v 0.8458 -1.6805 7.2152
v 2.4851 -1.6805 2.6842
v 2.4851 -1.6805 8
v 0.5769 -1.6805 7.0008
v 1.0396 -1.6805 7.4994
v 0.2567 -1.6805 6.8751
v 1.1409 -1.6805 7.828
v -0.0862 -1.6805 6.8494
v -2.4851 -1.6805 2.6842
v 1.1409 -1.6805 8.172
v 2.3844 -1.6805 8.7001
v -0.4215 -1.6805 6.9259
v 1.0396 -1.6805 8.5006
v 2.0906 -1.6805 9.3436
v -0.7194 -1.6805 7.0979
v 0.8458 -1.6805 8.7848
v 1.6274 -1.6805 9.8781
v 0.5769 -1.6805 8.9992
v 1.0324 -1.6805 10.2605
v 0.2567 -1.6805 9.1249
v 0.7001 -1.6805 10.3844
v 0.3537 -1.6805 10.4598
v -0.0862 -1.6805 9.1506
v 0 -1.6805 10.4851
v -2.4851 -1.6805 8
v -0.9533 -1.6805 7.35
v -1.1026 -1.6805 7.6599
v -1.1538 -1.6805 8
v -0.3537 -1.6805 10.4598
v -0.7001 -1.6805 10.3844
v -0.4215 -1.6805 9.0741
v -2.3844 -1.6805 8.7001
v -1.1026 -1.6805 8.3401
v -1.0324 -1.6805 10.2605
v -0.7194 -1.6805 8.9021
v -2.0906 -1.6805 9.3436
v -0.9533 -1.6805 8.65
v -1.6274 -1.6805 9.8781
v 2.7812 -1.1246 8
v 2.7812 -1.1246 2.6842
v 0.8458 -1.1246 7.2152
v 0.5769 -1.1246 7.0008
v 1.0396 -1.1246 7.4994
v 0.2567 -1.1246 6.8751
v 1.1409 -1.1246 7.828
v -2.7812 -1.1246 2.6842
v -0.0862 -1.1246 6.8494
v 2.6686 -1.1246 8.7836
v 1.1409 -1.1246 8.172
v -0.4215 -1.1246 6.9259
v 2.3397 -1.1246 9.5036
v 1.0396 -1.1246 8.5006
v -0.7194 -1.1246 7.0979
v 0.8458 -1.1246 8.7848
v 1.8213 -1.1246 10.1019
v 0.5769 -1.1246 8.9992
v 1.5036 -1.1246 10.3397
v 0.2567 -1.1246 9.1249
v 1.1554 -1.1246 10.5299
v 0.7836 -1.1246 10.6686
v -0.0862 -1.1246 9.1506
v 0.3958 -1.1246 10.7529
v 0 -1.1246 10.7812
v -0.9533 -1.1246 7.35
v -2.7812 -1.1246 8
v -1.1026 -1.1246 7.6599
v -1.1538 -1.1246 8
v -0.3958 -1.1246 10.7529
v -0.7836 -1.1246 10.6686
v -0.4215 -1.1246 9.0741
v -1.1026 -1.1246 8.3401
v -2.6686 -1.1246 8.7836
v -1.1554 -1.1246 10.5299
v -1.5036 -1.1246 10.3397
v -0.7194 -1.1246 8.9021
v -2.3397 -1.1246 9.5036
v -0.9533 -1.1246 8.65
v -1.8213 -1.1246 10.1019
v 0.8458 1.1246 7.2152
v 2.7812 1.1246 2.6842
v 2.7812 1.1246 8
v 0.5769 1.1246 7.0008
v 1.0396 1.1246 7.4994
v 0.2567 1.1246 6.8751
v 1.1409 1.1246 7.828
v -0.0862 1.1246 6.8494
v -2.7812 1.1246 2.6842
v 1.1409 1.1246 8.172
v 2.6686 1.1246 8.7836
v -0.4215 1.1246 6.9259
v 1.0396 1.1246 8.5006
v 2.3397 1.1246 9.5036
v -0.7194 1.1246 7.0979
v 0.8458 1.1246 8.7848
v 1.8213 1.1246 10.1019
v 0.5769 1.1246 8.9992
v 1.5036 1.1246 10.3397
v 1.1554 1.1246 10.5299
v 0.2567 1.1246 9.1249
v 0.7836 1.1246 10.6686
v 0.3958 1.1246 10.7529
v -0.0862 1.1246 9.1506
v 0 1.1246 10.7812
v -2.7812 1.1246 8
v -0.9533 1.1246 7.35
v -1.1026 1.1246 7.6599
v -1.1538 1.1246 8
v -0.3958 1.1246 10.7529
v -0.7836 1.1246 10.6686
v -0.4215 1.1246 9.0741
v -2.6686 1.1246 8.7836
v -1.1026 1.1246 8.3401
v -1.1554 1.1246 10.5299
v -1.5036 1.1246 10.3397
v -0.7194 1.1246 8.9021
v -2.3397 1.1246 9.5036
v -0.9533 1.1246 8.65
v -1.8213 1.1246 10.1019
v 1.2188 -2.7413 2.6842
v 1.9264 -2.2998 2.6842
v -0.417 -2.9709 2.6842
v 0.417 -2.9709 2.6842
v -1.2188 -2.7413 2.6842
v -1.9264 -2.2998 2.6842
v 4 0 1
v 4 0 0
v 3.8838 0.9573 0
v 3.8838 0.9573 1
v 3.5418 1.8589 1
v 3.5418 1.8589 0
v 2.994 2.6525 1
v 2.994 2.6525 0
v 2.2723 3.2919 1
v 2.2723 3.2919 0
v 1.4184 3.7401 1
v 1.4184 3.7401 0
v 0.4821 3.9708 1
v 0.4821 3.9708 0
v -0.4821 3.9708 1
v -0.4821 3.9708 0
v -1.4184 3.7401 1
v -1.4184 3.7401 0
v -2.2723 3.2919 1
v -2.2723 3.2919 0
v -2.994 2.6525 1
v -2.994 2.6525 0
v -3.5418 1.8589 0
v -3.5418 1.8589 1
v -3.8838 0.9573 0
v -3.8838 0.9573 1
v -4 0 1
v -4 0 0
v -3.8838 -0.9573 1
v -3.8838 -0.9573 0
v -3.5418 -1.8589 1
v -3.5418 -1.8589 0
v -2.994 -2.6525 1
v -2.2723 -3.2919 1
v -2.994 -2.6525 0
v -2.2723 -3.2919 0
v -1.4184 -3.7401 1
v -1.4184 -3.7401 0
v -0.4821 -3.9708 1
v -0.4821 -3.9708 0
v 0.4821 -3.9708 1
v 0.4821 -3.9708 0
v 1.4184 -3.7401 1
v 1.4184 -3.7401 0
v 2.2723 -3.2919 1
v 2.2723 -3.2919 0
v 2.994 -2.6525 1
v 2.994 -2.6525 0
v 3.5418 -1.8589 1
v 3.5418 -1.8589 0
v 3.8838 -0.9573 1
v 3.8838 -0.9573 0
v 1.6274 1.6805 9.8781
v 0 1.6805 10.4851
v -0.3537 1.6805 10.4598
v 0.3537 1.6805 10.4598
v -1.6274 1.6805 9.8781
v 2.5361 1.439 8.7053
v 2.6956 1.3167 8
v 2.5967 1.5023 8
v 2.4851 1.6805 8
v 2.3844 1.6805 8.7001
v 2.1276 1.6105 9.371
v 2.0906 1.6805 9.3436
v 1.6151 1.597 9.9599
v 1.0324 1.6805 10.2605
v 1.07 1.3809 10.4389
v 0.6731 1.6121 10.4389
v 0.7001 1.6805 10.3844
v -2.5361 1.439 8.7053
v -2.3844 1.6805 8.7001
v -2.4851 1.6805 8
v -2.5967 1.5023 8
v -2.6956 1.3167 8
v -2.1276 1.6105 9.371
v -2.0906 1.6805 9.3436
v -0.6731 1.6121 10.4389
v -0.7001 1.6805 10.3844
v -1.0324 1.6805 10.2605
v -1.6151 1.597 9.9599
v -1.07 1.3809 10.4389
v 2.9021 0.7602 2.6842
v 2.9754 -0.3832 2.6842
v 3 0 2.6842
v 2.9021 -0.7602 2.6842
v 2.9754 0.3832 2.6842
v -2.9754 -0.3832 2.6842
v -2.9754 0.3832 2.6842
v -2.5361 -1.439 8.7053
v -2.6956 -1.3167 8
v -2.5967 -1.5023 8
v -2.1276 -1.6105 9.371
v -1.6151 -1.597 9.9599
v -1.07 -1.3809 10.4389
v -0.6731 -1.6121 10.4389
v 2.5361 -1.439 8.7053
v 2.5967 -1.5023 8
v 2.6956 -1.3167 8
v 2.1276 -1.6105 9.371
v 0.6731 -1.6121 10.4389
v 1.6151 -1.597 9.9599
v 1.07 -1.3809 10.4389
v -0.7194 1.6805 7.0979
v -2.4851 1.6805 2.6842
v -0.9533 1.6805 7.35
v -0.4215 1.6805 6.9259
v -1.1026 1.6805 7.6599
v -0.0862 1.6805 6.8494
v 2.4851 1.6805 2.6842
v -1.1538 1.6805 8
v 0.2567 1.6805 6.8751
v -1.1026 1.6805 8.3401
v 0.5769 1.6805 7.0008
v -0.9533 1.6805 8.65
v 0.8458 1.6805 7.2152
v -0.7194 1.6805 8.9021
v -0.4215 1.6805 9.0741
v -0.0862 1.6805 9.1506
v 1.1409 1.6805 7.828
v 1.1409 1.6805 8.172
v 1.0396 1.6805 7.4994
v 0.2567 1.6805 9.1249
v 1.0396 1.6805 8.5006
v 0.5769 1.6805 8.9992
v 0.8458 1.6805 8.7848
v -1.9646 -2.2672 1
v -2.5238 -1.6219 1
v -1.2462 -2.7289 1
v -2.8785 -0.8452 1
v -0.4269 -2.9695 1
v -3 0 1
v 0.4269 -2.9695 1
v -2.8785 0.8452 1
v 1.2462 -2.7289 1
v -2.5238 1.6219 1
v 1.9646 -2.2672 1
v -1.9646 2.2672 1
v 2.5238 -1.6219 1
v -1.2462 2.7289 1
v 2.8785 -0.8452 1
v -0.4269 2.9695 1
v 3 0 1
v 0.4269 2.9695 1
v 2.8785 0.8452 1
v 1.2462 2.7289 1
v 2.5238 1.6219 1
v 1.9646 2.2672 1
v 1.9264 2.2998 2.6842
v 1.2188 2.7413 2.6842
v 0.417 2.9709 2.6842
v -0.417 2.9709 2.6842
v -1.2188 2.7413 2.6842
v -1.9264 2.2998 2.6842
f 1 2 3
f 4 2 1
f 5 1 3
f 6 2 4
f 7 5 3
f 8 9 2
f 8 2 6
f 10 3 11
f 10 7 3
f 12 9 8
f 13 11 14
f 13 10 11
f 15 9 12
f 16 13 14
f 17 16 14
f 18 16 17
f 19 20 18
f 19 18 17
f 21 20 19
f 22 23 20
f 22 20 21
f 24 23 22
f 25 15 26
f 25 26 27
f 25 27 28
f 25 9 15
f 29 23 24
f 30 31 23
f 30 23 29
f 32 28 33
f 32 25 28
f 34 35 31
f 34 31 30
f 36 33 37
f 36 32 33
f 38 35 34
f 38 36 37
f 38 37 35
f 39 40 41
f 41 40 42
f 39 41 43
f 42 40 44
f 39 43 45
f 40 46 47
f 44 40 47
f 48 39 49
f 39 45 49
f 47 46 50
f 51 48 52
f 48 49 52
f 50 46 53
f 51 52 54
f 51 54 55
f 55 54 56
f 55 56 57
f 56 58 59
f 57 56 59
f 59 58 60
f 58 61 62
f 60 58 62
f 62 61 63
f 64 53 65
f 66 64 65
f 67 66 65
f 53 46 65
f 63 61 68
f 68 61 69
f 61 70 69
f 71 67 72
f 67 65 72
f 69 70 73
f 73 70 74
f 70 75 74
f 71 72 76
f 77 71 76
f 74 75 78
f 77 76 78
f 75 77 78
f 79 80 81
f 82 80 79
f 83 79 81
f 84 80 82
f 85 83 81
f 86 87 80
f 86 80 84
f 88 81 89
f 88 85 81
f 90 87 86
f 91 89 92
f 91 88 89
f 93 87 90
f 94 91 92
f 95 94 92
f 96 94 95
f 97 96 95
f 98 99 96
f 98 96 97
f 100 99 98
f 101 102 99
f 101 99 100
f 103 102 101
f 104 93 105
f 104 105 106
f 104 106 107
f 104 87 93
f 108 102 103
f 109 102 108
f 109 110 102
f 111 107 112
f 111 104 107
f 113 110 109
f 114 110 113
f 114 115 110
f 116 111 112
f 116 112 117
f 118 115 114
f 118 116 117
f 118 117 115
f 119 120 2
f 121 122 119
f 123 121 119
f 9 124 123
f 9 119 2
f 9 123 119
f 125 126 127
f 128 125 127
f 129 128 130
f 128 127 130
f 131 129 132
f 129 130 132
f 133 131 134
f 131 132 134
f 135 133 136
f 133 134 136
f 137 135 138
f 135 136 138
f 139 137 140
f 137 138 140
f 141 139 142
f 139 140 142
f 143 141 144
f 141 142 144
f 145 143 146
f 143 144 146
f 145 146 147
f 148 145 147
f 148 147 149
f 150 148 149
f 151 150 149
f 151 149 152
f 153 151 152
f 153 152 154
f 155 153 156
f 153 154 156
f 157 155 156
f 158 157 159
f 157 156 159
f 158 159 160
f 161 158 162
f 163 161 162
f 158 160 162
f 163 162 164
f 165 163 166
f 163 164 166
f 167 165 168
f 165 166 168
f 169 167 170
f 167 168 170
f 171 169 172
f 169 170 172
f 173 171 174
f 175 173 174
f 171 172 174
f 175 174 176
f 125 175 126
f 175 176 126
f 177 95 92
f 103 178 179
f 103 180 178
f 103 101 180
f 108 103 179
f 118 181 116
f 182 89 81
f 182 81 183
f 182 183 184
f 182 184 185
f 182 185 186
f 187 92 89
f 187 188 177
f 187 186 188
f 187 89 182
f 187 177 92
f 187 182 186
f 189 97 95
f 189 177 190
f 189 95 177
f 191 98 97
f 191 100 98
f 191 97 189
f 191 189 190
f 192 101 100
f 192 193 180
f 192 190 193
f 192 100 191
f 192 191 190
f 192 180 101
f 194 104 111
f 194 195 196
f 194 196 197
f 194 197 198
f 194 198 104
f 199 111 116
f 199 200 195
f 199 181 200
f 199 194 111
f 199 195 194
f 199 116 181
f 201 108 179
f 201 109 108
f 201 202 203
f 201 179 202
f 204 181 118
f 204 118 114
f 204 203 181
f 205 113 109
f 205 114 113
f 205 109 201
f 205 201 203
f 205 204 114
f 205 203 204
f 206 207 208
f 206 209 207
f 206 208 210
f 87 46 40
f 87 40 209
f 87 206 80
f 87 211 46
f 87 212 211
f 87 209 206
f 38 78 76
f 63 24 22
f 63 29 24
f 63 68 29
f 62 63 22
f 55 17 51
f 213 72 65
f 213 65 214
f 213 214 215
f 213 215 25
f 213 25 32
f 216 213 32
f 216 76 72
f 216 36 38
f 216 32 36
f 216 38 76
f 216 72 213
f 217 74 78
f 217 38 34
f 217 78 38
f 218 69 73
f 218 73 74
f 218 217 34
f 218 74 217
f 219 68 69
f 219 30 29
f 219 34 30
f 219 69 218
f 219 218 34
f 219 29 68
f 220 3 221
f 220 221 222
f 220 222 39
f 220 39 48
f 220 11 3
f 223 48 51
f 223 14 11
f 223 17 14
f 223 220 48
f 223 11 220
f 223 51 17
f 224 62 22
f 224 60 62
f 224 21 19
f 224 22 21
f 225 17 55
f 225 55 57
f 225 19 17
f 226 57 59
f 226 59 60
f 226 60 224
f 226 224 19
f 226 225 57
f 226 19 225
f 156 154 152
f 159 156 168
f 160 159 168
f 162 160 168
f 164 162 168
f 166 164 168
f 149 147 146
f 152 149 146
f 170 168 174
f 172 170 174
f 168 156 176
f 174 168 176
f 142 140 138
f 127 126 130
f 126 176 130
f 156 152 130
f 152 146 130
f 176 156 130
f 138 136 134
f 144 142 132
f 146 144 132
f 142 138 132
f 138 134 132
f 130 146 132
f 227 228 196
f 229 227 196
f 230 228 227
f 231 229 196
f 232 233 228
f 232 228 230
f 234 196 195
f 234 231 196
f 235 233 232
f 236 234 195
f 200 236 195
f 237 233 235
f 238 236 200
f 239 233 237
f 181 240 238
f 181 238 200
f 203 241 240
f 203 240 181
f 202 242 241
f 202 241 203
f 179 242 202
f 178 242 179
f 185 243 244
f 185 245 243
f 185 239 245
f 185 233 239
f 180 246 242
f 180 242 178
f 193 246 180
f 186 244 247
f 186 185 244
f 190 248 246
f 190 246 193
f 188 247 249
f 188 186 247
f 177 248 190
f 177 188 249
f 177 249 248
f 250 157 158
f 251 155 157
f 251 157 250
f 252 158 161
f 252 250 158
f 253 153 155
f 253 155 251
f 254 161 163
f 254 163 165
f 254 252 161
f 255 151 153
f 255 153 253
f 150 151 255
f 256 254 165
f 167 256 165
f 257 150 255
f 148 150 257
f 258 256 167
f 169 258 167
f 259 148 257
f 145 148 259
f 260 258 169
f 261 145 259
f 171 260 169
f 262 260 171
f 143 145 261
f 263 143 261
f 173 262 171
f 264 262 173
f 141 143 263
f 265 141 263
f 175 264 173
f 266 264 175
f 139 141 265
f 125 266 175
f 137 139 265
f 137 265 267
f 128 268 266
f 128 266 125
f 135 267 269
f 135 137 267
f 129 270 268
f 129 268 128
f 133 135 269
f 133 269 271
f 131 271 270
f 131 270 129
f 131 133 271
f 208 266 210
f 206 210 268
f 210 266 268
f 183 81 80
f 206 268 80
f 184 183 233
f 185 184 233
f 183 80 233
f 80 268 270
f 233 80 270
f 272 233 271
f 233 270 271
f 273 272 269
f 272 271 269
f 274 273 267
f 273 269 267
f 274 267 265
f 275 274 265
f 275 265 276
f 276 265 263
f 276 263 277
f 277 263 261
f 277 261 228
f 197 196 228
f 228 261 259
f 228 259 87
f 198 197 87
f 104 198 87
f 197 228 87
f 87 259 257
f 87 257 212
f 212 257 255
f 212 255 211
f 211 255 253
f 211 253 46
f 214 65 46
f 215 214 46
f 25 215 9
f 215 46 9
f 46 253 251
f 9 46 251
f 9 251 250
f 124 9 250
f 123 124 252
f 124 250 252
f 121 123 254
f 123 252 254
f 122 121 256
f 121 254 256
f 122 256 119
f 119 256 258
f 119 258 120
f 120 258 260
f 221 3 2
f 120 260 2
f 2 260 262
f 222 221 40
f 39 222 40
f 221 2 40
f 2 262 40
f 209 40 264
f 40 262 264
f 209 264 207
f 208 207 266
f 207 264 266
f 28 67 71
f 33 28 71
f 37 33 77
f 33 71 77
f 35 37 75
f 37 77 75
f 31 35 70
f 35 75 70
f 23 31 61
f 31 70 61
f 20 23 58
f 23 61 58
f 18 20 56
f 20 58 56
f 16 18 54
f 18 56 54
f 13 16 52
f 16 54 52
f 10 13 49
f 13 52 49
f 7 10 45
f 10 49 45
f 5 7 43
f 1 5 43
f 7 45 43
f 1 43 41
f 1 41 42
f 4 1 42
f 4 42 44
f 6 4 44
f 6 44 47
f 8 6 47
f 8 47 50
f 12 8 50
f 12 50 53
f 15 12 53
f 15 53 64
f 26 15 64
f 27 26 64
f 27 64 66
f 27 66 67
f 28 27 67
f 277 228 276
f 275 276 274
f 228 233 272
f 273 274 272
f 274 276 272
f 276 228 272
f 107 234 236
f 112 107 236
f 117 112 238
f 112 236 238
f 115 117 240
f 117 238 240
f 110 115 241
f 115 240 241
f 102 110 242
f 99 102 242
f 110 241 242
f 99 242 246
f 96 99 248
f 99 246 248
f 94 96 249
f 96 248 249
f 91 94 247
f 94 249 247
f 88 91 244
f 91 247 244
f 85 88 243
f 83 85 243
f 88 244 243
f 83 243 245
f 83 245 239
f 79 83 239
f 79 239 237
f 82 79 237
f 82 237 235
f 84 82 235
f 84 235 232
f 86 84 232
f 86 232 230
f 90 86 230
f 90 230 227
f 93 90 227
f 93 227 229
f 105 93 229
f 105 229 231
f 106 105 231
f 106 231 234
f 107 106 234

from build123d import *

# Parameters (mm, degrees)
F0_R     = 4
F1_DEPTH = 1
F2_R     = 3
F3_DEPTH = 10
F4_R     = 3
F5_W     = 2.2492834833
F5_H     = 10.7352328487
F5_W_2   = 1.4565391466
F6_DEPTH = 12.5
F7_R     = 1.1538217461
F8_DEPTH = 25


with BuildPart() as f1:
    # F0 (on Top) → F1 (new body)
    with BuildSketch(Plane.XY):
        Circle(F0_R)
    extrude(amount=F1_DEPTH)

    # F2 (on face) → F3 (join)
    with BuildSketch(Plane.XY.offset(1)):
        Circle(F2_R)
    extrude(amount=F3_DEPTH)

    # F4
    f4_edges = [f1.edges().sort_by_distance(p)[0] for p in [
        (-3, 0, 11),
    ]]
    fillet(f4_edges, radius=F4_R)

    # F5 (on Right) → F6 (cut, symmetric)
    with BuildSketch(Plane.YZ):
        with Locations((0, 8.051795885)):
            Rectangle(F5_W, F5_H)
        with Locations((-2.4088141508, 8.051795885)):
            Rectangle(F5_W_2, F5_H)
        with Locations((2.4088141508, 8.051795885)):
            Rectangle(F5_W_2, F5_H)
    extrude(amount=F6_DEPTH, both=True, mode=Mode.SUBTRACT)

    # F7 (on face) → F8 (cut)
    with BuildSketch(Plane(origin=(0, 1.6805445775, 0), x_dir=(-1, 0, 0), z_dir=(0, 1, 0))):
        with Locations((0, 8)):
            Circle(F7_R)
    extrude(amount=-F8_DEPTH, mode=Mode.SUBTRACT)


solid = f1.part
